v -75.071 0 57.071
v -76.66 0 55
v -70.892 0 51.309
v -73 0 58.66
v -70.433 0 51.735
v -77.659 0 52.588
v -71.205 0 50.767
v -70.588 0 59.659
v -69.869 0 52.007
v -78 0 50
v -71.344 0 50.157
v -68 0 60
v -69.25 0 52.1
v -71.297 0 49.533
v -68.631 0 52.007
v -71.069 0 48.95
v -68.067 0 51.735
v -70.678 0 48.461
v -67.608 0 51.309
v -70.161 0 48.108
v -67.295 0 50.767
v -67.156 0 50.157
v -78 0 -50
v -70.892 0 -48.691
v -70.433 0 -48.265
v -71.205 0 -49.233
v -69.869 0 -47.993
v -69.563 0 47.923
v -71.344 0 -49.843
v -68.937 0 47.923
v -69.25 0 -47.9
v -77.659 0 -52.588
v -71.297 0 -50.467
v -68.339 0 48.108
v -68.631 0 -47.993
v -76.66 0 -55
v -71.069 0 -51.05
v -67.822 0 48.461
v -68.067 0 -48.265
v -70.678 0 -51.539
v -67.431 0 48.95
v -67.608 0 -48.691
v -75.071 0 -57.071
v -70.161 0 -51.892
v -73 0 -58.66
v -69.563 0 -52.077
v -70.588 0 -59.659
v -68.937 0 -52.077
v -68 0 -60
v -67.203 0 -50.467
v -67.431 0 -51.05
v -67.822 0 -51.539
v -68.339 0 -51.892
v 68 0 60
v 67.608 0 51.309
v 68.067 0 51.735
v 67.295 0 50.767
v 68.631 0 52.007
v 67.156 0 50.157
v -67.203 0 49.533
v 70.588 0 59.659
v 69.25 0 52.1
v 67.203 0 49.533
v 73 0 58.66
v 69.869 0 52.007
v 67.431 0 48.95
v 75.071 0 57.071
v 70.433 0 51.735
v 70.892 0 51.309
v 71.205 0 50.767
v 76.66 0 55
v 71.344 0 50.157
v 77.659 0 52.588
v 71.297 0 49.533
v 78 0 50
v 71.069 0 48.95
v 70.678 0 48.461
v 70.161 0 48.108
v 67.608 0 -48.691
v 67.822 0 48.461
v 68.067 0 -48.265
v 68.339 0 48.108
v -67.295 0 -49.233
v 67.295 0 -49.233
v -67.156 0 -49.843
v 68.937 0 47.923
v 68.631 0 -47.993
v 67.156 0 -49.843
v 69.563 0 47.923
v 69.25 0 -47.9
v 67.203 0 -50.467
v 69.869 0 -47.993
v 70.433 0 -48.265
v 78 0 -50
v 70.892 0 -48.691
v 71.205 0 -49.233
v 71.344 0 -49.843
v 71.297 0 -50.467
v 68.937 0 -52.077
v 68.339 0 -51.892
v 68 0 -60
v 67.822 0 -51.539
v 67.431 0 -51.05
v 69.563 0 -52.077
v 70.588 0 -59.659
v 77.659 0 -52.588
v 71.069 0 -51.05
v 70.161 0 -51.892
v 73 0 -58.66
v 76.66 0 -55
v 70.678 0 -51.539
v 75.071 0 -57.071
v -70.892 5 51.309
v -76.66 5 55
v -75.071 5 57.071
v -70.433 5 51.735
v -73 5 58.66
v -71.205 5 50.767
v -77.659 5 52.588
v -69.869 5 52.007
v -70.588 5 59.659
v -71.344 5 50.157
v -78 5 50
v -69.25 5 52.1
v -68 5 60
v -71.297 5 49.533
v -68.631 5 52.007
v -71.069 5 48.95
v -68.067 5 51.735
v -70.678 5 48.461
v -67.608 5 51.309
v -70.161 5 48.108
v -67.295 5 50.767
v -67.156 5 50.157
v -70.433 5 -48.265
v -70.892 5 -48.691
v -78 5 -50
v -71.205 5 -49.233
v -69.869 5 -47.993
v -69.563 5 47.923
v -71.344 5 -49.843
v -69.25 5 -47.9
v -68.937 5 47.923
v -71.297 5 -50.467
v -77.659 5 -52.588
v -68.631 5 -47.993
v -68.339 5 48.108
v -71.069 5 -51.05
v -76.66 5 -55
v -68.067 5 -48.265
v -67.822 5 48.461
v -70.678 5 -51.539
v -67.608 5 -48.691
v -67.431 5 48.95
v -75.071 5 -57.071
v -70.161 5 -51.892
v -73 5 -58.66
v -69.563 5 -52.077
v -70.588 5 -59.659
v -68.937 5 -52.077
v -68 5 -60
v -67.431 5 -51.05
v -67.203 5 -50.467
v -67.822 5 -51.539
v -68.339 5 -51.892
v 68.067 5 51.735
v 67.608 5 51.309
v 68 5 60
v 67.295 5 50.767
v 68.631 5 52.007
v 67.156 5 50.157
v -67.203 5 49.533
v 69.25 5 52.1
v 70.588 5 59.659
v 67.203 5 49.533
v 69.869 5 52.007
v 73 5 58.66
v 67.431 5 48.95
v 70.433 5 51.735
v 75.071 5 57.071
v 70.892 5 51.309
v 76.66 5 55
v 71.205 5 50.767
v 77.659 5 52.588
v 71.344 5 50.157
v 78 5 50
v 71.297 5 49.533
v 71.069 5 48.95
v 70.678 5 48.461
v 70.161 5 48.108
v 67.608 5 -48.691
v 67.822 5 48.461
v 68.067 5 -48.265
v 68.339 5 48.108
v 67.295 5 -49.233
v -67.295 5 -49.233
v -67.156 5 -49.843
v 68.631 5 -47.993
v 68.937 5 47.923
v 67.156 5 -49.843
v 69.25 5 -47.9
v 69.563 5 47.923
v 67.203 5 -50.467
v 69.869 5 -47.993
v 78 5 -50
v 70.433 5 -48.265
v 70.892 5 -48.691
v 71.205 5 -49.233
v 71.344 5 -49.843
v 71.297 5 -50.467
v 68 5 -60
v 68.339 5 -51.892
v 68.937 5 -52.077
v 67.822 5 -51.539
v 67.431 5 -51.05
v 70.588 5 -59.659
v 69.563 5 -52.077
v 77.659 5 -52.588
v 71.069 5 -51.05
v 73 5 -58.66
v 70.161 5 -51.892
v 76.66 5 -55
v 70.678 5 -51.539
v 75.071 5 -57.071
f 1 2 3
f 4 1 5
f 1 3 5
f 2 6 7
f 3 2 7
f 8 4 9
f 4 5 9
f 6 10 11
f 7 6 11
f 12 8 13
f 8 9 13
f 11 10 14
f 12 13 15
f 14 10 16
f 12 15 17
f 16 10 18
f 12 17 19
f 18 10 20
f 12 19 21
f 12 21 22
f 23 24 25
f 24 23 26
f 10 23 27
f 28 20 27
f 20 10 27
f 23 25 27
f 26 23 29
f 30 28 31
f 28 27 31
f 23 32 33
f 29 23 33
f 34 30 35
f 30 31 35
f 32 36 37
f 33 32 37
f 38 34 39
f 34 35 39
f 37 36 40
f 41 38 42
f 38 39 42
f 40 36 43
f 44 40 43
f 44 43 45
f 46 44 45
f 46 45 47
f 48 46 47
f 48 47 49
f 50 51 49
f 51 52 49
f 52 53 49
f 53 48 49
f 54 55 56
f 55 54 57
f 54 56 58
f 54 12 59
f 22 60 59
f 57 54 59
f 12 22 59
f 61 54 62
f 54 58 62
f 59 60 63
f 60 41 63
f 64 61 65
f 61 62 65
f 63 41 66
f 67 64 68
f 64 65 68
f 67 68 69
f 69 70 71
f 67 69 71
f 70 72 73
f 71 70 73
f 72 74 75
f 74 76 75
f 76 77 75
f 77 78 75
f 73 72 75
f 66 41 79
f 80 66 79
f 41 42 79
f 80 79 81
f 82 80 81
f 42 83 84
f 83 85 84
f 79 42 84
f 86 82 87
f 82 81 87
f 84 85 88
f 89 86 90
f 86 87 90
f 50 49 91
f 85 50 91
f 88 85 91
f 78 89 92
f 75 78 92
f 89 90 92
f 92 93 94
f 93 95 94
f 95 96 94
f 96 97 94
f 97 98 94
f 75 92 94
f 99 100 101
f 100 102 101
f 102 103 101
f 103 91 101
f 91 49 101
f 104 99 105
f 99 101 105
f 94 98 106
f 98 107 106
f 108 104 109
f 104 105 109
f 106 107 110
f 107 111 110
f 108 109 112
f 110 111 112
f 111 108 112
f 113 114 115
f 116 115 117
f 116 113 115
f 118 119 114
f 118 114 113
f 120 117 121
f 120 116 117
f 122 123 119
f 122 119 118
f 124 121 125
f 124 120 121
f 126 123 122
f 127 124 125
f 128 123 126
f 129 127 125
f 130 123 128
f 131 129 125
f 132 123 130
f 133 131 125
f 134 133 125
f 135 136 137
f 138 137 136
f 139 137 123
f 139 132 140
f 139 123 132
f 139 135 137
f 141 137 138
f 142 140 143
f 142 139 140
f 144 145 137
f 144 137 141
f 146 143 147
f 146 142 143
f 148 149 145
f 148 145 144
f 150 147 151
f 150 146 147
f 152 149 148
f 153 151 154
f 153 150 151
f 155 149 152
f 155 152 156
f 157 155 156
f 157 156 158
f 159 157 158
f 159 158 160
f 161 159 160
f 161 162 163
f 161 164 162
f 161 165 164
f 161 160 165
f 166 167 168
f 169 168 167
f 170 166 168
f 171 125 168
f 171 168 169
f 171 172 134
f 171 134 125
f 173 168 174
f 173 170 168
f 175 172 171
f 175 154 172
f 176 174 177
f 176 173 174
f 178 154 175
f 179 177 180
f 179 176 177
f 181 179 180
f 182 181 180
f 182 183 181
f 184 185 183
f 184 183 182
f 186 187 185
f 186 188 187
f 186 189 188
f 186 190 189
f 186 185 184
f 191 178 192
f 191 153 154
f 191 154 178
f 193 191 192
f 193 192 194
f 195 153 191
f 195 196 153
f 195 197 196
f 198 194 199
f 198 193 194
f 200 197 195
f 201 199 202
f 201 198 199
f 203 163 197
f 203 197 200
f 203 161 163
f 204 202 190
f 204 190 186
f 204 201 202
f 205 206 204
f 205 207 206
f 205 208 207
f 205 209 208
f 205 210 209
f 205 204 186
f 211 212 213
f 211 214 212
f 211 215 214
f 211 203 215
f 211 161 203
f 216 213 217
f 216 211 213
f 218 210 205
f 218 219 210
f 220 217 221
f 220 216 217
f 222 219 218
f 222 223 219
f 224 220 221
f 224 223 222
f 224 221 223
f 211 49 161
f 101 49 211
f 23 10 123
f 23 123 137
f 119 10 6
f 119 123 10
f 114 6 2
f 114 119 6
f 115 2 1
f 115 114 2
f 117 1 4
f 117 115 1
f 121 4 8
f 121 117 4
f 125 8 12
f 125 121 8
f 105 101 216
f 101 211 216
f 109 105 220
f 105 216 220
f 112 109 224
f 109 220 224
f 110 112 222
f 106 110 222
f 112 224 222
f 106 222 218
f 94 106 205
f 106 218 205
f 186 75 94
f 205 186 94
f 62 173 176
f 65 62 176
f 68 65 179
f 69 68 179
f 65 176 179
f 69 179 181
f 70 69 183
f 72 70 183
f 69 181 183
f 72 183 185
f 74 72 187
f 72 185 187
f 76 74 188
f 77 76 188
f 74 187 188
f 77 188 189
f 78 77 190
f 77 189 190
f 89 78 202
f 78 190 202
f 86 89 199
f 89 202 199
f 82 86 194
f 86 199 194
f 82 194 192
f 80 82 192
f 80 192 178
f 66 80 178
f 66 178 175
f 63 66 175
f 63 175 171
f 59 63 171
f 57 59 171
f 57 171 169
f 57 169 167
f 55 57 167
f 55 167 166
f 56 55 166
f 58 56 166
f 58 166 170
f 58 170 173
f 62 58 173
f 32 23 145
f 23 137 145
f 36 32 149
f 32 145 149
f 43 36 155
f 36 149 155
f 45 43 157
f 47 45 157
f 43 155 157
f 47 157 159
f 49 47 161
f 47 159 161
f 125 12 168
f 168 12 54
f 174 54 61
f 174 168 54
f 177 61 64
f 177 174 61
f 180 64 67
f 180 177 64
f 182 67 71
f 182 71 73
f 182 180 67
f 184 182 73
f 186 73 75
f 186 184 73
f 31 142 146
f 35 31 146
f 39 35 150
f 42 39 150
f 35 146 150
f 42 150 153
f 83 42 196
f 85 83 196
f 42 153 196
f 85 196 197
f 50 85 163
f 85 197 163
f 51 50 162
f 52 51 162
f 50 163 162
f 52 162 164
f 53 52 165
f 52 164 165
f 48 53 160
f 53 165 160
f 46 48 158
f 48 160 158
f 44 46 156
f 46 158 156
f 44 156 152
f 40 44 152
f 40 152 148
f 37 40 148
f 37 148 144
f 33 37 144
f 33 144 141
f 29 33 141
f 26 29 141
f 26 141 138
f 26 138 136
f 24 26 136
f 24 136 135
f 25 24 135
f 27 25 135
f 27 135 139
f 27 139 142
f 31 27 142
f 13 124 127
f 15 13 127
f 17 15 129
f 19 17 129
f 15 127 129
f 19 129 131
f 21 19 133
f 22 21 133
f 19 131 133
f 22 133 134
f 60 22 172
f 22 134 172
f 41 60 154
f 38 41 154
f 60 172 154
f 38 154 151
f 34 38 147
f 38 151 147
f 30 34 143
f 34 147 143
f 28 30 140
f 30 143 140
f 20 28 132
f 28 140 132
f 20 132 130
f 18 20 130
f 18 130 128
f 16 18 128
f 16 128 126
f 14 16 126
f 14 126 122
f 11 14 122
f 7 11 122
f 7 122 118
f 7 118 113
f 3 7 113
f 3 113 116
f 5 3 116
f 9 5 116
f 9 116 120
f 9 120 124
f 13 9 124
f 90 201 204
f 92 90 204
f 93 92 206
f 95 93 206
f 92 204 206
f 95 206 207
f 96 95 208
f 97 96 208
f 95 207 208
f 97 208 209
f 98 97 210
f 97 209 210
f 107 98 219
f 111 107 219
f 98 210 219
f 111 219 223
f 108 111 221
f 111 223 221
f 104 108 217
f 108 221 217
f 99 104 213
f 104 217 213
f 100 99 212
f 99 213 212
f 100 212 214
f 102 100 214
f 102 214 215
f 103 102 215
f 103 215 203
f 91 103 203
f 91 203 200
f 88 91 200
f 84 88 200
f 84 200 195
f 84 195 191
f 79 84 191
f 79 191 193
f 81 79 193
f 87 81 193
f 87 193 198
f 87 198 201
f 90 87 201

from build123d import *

# Parameters (mm, degrees)
SKETCH5_W           = 156
SKETCH5_H           = 120
BOSS_EXTRUDE3_DEPTH = 5
SKETCH6_R           = 2.1
CUT_EXTRUDE2_DEPTH  = 99.534258002
FILLET1_R           = 10


with BuildPart() as part:
    # Sketch5 → Boss-Extrude3 (new body)
    with BuildSketch(Plane(origin=(0, 0, 0), x_dir=(1, 0, 0), z_dir=(0, 1, 0))):
        Rectangle(SKETCH5_W, SKETCH5_H)
    extrude(amount=BOSS_EXTRUDE3_DEPTH)

    # Sketch6 → Cut-Extrude2 (cut, through all)
    with BuildSketch(Plane(origin=(0, 5, 0), x_dir=(1, 0, 0), z_dir=(0, 1, 0))):
        with Locations(Location((-69.25, 50, 0), (0, 0, 270))):
            Circle(SKETCH6_R)
        with Locations(Location((69.25, 50, 0), (0, 0, 270))):
            Circle(SKETCH6_R)
        with Locations(Location((-69.25, -50, 0), (0, 0, 270))):
            Circle(SKETCH6_R)
        with Locations(Location((69.25, -50, 0), (0, 0, 270))):
            Circle(SKETCH6_R)
    extrude(amount=-CUT_EXTRUDE2_DEPTH, mode=Mode.SUBTRACT)

    # Fillet1
    fillet1_edges = [part.edges().sort_by_distance(p)[0] for p in [
        (78, 2.5, 60),
        (-78, 2.5, 60),
        (-78, 2.5, -60),
        (78, 2.5, -60),
    ]]
    fillet(fillet1_edges, radius=FILLET1_R)


solid = part.part
